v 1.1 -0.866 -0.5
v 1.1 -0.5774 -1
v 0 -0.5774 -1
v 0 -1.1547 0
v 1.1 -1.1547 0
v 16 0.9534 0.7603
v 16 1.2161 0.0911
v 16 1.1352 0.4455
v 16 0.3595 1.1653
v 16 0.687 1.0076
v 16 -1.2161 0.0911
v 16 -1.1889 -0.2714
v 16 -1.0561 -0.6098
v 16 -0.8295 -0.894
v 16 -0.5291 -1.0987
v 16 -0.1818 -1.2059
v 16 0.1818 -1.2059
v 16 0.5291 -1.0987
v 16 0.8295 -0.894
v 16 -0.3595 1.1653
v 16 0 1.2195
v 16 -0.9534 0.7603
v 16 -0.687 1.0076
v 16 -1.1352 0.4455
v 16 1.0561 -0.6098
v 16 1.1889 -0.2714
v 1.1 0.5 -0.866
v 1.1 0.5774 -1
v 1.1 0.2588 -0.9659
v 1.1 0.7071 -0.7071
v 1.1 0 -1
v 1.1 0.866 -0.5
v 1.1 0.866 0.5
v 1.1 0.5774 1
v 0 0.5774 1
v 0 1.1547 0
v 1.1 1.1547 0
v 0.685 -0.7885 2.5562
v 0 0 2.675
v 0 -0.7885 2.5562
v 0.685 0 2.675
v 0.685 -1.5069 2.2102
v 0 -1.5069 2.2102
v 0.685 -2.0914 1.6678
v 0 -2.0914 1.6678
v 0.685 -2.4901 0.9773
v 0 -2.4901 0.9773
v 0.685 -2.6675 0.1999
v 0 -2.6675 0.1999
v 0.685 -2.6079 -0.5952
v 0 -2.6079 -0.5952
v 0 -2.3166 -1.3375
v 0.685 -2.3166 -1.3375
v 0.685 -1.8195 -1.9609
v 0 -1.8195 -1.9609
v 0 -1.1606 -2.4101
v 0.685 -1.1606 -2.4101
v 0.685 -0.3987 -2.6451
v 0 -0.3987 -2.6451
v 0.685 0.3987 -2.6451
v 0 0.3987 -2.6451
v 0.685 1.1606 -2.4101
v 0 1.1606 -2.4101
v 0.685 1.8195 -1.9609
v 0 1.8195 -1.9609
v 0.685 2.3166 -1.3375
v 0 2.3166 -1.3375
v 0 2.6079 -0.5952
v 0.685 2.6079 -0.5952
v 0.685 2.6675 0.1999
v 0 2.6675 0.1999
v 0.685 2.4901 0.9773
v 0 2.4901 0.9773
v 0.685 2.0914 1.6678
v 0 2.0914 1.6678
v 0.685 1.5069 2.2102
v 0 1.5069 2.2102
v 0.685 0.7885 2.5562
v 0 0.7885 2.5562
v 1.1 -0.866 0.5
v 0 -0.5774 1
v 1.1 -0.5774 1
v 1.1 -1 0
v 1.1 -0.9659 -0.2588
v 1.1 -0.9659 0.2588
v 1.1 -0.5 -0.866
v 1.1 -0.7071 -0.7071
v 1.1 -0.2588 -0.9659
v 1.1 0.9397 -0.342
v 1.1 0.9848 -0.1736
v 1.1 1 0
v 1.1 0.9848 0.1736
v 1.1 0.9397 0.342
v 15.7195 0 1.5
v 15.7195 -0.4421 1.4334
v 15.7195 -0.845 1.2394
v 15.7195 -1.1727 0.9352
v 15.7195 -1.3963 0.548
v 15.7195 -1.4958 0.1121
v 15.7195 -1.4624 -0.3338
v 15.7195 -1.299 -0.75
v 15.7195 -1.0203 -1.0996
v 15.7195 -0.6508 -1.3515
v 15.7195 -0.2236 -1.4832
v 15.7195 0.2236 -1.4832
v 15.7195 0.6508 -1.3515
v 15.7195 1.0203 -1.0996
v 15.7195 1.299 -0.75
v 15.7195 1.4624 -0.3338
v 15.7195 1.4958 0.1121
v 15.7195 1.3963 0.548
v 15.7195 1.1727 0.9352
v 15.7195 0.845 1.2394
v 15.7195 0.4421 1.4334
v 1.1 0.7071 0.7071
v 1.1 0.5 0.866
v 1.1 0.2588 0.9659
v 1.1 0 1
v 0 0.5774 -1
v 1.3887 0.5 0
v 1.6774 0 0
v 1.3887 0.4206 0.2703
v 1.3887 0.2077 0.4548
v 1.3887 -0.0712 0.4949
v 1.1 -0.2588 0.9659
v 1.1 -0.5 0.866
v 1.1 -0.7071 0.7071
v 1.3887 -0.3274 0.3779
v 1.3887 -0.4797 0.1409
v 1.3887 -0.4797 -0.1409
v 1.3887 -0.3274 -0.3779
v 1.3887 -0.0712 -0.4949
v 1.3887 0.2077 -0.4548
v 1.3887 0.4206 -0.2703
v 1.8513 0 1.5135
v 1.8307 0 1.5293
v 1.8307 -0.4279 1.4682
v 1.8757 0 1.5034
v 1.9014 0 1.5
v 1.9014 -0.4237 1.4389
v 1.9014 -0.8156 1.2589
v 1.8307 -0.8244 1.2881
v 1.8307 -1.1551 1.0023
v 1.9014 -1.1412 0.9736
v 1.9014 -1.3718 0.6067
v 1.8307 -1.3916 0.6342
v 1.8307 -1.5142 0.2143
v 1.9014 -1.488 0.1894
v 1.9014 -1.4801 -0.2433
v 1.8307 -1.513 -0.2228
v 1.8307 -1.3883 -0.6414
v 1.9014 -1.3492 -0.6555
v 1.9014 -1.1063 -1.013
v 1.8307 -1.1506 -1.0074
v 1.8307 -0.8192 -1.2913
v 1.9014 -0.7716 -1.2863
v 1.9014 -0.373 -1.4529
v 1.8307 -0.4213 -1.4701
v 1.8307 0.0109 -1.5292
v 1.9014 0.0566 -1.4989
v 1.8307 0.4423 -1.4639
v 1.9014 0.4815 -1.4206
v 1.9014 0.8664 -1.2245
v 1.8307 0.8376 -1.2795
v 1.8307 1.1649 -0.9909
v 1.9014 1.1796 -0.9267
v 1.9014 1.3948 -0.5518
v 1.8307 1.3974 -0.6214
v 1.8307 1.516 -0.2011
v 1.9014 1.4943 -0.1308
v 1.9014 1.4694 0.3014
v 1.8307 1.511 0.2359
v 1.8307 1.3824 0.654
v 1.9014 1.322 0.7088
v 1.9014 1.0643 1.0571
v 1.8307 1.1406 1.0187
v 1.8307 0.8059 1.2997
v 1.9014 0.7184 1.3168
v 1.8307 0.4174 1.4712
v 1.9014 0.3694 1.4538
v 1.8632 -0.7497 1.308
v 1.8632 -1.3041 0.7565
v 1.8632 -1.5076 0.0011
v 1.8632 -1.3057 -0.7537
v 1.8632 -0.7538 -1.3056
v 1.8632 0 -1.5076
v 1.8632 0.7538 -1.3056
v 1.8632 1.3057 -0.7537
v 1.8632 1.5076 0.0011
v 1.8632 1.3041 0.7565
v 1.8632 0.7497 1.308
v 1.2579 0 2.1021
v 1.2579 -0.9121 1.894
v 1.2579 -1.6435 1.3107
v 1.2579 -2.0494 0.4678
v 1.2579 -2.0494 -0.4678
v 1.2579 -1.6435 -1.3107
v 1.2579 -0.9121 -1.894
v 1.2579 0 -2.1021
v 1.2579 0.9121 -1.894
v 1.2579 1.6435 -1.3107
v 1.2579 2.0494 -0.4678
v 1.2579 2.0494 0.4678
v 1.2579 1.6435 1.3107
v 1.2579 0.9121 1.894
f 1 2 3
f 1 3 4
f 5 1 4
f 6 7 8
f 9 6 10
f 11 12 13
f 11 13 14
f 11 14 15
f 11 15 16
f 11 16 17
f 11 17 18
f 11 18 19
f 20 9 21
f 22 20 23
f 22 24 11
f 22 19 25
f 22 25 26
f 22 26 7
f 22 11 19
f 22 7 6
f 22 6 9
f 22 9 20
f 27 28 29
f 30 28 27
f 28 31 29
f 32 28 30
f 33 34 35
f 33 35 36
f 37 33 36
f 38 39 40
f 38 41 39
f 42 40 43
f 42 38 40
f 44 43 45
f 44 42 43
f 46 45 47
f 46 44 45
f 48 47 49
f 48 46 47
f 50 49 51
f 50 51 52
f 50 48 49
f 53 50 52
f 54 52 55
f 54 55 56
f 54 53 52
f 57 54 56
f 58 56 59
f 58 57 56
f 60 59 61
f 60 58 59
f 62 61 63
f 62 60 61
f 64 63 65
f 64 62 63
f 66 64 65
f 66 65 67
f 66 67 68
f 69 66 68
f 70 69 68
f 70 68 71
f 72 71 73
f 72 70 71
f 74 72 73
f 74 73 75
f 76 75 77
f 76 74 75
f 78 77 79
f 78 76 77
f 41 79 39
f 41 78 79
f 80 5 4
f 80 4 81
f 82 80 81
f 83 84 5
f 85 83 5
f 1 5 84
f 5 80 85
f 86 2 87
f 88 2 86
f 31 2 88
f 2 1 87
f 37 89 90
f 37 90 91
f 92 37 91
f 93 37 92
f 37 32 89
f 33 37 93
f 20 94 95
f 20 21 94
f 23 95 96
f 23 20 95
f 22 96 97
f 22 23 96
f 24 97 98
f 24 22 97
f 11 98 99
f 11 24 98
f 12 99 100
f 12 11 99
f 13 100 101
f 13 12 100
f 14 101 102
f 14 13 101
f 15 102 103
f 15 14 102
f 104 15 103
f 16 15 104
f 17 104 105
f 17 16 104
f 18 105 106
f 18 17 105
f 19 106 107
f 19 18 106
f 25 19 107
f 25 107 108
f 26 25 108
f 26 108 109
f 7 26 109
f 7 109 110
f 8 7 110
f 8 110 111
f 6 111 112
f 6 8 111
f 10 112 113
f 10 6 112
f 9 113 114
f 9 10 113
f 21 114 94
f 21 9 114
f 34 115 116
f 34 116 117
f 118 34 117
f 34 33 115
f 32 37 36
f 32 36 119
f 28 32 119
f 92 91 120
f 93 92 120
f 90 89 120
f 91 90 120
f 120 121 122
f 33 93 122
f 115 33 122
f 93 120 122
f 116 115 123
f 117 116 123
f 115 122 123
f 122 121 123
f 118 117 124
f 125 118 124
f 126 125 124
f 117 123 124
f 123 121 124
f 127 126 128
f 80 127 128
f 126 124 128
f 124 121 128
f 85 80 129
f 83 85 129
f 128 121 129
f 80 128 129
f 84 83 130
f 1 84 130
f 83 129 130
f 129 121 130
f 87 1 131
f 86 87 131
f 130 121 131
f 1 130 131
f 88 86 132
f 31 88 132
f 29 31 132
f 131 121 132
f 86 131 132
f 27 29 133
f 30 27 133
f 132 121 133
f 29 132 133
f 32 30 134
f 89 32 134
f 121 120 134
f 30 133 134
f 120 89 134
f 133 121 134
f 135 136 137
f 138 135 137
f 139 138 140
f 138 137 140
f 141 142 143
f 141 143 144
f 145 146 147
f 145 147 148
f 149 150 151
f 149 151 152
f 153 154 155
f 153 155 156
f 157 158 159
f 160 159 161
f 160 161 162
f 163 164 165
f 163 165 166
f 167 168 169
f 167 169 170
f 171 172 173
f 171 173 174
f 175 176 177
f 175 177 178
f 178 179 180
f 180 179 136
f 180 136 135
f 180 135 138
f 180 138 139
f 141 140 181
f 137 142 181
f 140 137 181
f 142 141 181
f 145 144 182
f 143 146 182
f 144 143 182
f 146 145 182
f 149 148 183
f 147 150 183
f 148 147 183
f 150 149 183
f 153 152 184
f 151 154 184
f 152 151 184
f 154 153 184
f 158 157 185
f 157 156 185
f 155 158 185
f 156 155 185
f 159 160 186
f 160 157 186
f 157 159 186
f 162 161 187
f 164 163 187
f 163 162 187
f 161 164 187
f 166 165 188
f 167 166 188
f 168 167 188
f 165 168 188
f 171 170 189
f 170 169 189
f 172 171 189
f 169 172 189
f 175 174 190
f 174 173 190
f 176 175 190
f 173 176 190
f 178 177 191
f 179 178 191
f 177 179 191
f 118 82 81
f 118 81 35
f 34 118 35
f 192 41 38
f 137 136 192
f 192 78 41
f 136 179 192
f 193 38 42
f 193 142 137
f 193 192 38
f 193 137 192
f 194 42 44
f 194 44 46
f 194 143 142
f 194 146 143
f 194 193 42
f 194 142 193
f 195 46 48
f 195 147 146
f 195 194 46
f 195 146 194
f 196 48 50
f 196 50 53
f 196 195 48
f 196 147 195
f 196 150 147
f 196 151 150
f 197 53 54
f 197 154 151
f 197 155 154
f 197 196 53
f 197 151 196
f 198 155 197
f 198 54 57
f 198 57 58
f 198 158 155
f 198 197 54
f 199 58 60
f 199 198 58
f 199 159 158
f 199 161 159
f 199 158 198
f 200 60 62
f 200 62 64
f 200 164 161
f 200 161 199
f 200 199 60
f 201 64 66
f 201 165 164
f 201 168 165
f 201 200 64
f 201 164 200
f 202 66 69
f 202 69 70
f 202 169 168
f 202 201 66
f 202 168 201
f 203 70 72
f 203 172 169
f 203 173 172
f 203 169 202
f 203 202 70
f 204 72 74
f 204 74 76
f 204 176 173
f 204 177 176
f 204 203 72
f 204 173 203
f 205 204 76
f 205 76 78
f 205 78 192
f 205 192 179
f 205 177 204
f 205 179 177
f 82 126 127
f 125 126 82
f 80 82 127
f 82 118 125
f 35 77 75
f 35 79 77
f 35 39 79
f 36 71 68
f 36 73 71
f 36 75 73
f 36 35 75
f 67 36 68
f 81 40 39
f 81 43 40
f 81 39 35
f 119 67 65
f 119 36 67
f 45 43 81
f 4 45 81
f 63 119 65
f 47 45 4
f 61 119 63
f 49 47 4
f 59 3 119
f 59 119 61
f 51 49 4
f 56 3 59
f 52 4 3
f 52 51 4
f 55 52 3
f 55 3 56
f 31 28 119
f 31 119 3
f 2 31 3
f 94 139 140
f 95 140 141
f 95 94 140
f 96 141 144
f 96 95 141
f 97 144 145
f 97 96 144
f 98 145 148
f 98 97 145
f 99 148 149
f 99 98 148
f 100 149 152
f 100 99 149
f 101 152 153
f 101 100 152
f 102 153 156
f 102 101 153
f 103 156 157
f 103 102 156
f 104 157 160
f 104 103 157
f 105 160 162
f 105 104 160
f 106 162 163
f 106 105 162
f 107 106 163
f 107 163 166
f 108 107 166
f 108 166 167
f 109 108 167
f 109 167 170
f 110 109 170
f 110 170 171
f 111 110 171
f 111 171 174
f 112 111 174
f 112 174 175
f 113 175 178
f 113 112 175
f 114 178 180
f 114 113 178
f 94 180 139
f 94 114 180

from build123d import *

# Parameters (mm, degrees)
FILLET1_R   = 0.1
HEX_START   = -1.1
HEX_2_DEPTH = 1.1


with BuildPart() as part:
    # BodySke → BaseBody (revolve)
    with BuildSketch(Plane.XY, mode=Mode.PRIVATE) as basebody_sk:
        Polygon((0, 0), (0, 2.675), (0.685, 2.675), (1.86, 1.5), (15.7195, 1.5), (16, 1.2195), (16, 0), align=None)
    revolve(basebody_sk.sketch.rotate(Axis((0, 0, 0), (1, 0, 0)), 90), axis=Axis((0, 0, 0), (1, 0, 0)))

    # Fillet1
    fillet1_edges = [part.edges().sort_by_distance(p)[0] for p in [
        (1.86, 0, -1.5),
    ]]
    fillet(fillet1_edges, radius=FILLET1_R)

    # Hex 2: read off the stored shape, not the designer's step
    # Hex 2 outline → Hex 2 (cut)
    with BuildSketch(Plane.ZY.offset(HEX_START)):
        Polygon((-1, -0.577350269), (0, -1.154700538), (1, -0.577350269), (1, 0.577350269), (0, 1.154700538), (-1, 0.577350269), align=None)
    extrude(amount=HEX_2_DEPTH, mode=Mode.SUBTRACT)

    # Hex 2 2 outline → Hex 2 2 (revolve, cut)
    with BuildSketch(Plane.YX):
        Polygon((1, 1.1), (0, 1.677350269), (0, 1.1), align=None)
    revolve(axis=Axis((0, 0, 0), (1, 0, 0)), mode=Mode.SUBTRACT)


solid = part.part
